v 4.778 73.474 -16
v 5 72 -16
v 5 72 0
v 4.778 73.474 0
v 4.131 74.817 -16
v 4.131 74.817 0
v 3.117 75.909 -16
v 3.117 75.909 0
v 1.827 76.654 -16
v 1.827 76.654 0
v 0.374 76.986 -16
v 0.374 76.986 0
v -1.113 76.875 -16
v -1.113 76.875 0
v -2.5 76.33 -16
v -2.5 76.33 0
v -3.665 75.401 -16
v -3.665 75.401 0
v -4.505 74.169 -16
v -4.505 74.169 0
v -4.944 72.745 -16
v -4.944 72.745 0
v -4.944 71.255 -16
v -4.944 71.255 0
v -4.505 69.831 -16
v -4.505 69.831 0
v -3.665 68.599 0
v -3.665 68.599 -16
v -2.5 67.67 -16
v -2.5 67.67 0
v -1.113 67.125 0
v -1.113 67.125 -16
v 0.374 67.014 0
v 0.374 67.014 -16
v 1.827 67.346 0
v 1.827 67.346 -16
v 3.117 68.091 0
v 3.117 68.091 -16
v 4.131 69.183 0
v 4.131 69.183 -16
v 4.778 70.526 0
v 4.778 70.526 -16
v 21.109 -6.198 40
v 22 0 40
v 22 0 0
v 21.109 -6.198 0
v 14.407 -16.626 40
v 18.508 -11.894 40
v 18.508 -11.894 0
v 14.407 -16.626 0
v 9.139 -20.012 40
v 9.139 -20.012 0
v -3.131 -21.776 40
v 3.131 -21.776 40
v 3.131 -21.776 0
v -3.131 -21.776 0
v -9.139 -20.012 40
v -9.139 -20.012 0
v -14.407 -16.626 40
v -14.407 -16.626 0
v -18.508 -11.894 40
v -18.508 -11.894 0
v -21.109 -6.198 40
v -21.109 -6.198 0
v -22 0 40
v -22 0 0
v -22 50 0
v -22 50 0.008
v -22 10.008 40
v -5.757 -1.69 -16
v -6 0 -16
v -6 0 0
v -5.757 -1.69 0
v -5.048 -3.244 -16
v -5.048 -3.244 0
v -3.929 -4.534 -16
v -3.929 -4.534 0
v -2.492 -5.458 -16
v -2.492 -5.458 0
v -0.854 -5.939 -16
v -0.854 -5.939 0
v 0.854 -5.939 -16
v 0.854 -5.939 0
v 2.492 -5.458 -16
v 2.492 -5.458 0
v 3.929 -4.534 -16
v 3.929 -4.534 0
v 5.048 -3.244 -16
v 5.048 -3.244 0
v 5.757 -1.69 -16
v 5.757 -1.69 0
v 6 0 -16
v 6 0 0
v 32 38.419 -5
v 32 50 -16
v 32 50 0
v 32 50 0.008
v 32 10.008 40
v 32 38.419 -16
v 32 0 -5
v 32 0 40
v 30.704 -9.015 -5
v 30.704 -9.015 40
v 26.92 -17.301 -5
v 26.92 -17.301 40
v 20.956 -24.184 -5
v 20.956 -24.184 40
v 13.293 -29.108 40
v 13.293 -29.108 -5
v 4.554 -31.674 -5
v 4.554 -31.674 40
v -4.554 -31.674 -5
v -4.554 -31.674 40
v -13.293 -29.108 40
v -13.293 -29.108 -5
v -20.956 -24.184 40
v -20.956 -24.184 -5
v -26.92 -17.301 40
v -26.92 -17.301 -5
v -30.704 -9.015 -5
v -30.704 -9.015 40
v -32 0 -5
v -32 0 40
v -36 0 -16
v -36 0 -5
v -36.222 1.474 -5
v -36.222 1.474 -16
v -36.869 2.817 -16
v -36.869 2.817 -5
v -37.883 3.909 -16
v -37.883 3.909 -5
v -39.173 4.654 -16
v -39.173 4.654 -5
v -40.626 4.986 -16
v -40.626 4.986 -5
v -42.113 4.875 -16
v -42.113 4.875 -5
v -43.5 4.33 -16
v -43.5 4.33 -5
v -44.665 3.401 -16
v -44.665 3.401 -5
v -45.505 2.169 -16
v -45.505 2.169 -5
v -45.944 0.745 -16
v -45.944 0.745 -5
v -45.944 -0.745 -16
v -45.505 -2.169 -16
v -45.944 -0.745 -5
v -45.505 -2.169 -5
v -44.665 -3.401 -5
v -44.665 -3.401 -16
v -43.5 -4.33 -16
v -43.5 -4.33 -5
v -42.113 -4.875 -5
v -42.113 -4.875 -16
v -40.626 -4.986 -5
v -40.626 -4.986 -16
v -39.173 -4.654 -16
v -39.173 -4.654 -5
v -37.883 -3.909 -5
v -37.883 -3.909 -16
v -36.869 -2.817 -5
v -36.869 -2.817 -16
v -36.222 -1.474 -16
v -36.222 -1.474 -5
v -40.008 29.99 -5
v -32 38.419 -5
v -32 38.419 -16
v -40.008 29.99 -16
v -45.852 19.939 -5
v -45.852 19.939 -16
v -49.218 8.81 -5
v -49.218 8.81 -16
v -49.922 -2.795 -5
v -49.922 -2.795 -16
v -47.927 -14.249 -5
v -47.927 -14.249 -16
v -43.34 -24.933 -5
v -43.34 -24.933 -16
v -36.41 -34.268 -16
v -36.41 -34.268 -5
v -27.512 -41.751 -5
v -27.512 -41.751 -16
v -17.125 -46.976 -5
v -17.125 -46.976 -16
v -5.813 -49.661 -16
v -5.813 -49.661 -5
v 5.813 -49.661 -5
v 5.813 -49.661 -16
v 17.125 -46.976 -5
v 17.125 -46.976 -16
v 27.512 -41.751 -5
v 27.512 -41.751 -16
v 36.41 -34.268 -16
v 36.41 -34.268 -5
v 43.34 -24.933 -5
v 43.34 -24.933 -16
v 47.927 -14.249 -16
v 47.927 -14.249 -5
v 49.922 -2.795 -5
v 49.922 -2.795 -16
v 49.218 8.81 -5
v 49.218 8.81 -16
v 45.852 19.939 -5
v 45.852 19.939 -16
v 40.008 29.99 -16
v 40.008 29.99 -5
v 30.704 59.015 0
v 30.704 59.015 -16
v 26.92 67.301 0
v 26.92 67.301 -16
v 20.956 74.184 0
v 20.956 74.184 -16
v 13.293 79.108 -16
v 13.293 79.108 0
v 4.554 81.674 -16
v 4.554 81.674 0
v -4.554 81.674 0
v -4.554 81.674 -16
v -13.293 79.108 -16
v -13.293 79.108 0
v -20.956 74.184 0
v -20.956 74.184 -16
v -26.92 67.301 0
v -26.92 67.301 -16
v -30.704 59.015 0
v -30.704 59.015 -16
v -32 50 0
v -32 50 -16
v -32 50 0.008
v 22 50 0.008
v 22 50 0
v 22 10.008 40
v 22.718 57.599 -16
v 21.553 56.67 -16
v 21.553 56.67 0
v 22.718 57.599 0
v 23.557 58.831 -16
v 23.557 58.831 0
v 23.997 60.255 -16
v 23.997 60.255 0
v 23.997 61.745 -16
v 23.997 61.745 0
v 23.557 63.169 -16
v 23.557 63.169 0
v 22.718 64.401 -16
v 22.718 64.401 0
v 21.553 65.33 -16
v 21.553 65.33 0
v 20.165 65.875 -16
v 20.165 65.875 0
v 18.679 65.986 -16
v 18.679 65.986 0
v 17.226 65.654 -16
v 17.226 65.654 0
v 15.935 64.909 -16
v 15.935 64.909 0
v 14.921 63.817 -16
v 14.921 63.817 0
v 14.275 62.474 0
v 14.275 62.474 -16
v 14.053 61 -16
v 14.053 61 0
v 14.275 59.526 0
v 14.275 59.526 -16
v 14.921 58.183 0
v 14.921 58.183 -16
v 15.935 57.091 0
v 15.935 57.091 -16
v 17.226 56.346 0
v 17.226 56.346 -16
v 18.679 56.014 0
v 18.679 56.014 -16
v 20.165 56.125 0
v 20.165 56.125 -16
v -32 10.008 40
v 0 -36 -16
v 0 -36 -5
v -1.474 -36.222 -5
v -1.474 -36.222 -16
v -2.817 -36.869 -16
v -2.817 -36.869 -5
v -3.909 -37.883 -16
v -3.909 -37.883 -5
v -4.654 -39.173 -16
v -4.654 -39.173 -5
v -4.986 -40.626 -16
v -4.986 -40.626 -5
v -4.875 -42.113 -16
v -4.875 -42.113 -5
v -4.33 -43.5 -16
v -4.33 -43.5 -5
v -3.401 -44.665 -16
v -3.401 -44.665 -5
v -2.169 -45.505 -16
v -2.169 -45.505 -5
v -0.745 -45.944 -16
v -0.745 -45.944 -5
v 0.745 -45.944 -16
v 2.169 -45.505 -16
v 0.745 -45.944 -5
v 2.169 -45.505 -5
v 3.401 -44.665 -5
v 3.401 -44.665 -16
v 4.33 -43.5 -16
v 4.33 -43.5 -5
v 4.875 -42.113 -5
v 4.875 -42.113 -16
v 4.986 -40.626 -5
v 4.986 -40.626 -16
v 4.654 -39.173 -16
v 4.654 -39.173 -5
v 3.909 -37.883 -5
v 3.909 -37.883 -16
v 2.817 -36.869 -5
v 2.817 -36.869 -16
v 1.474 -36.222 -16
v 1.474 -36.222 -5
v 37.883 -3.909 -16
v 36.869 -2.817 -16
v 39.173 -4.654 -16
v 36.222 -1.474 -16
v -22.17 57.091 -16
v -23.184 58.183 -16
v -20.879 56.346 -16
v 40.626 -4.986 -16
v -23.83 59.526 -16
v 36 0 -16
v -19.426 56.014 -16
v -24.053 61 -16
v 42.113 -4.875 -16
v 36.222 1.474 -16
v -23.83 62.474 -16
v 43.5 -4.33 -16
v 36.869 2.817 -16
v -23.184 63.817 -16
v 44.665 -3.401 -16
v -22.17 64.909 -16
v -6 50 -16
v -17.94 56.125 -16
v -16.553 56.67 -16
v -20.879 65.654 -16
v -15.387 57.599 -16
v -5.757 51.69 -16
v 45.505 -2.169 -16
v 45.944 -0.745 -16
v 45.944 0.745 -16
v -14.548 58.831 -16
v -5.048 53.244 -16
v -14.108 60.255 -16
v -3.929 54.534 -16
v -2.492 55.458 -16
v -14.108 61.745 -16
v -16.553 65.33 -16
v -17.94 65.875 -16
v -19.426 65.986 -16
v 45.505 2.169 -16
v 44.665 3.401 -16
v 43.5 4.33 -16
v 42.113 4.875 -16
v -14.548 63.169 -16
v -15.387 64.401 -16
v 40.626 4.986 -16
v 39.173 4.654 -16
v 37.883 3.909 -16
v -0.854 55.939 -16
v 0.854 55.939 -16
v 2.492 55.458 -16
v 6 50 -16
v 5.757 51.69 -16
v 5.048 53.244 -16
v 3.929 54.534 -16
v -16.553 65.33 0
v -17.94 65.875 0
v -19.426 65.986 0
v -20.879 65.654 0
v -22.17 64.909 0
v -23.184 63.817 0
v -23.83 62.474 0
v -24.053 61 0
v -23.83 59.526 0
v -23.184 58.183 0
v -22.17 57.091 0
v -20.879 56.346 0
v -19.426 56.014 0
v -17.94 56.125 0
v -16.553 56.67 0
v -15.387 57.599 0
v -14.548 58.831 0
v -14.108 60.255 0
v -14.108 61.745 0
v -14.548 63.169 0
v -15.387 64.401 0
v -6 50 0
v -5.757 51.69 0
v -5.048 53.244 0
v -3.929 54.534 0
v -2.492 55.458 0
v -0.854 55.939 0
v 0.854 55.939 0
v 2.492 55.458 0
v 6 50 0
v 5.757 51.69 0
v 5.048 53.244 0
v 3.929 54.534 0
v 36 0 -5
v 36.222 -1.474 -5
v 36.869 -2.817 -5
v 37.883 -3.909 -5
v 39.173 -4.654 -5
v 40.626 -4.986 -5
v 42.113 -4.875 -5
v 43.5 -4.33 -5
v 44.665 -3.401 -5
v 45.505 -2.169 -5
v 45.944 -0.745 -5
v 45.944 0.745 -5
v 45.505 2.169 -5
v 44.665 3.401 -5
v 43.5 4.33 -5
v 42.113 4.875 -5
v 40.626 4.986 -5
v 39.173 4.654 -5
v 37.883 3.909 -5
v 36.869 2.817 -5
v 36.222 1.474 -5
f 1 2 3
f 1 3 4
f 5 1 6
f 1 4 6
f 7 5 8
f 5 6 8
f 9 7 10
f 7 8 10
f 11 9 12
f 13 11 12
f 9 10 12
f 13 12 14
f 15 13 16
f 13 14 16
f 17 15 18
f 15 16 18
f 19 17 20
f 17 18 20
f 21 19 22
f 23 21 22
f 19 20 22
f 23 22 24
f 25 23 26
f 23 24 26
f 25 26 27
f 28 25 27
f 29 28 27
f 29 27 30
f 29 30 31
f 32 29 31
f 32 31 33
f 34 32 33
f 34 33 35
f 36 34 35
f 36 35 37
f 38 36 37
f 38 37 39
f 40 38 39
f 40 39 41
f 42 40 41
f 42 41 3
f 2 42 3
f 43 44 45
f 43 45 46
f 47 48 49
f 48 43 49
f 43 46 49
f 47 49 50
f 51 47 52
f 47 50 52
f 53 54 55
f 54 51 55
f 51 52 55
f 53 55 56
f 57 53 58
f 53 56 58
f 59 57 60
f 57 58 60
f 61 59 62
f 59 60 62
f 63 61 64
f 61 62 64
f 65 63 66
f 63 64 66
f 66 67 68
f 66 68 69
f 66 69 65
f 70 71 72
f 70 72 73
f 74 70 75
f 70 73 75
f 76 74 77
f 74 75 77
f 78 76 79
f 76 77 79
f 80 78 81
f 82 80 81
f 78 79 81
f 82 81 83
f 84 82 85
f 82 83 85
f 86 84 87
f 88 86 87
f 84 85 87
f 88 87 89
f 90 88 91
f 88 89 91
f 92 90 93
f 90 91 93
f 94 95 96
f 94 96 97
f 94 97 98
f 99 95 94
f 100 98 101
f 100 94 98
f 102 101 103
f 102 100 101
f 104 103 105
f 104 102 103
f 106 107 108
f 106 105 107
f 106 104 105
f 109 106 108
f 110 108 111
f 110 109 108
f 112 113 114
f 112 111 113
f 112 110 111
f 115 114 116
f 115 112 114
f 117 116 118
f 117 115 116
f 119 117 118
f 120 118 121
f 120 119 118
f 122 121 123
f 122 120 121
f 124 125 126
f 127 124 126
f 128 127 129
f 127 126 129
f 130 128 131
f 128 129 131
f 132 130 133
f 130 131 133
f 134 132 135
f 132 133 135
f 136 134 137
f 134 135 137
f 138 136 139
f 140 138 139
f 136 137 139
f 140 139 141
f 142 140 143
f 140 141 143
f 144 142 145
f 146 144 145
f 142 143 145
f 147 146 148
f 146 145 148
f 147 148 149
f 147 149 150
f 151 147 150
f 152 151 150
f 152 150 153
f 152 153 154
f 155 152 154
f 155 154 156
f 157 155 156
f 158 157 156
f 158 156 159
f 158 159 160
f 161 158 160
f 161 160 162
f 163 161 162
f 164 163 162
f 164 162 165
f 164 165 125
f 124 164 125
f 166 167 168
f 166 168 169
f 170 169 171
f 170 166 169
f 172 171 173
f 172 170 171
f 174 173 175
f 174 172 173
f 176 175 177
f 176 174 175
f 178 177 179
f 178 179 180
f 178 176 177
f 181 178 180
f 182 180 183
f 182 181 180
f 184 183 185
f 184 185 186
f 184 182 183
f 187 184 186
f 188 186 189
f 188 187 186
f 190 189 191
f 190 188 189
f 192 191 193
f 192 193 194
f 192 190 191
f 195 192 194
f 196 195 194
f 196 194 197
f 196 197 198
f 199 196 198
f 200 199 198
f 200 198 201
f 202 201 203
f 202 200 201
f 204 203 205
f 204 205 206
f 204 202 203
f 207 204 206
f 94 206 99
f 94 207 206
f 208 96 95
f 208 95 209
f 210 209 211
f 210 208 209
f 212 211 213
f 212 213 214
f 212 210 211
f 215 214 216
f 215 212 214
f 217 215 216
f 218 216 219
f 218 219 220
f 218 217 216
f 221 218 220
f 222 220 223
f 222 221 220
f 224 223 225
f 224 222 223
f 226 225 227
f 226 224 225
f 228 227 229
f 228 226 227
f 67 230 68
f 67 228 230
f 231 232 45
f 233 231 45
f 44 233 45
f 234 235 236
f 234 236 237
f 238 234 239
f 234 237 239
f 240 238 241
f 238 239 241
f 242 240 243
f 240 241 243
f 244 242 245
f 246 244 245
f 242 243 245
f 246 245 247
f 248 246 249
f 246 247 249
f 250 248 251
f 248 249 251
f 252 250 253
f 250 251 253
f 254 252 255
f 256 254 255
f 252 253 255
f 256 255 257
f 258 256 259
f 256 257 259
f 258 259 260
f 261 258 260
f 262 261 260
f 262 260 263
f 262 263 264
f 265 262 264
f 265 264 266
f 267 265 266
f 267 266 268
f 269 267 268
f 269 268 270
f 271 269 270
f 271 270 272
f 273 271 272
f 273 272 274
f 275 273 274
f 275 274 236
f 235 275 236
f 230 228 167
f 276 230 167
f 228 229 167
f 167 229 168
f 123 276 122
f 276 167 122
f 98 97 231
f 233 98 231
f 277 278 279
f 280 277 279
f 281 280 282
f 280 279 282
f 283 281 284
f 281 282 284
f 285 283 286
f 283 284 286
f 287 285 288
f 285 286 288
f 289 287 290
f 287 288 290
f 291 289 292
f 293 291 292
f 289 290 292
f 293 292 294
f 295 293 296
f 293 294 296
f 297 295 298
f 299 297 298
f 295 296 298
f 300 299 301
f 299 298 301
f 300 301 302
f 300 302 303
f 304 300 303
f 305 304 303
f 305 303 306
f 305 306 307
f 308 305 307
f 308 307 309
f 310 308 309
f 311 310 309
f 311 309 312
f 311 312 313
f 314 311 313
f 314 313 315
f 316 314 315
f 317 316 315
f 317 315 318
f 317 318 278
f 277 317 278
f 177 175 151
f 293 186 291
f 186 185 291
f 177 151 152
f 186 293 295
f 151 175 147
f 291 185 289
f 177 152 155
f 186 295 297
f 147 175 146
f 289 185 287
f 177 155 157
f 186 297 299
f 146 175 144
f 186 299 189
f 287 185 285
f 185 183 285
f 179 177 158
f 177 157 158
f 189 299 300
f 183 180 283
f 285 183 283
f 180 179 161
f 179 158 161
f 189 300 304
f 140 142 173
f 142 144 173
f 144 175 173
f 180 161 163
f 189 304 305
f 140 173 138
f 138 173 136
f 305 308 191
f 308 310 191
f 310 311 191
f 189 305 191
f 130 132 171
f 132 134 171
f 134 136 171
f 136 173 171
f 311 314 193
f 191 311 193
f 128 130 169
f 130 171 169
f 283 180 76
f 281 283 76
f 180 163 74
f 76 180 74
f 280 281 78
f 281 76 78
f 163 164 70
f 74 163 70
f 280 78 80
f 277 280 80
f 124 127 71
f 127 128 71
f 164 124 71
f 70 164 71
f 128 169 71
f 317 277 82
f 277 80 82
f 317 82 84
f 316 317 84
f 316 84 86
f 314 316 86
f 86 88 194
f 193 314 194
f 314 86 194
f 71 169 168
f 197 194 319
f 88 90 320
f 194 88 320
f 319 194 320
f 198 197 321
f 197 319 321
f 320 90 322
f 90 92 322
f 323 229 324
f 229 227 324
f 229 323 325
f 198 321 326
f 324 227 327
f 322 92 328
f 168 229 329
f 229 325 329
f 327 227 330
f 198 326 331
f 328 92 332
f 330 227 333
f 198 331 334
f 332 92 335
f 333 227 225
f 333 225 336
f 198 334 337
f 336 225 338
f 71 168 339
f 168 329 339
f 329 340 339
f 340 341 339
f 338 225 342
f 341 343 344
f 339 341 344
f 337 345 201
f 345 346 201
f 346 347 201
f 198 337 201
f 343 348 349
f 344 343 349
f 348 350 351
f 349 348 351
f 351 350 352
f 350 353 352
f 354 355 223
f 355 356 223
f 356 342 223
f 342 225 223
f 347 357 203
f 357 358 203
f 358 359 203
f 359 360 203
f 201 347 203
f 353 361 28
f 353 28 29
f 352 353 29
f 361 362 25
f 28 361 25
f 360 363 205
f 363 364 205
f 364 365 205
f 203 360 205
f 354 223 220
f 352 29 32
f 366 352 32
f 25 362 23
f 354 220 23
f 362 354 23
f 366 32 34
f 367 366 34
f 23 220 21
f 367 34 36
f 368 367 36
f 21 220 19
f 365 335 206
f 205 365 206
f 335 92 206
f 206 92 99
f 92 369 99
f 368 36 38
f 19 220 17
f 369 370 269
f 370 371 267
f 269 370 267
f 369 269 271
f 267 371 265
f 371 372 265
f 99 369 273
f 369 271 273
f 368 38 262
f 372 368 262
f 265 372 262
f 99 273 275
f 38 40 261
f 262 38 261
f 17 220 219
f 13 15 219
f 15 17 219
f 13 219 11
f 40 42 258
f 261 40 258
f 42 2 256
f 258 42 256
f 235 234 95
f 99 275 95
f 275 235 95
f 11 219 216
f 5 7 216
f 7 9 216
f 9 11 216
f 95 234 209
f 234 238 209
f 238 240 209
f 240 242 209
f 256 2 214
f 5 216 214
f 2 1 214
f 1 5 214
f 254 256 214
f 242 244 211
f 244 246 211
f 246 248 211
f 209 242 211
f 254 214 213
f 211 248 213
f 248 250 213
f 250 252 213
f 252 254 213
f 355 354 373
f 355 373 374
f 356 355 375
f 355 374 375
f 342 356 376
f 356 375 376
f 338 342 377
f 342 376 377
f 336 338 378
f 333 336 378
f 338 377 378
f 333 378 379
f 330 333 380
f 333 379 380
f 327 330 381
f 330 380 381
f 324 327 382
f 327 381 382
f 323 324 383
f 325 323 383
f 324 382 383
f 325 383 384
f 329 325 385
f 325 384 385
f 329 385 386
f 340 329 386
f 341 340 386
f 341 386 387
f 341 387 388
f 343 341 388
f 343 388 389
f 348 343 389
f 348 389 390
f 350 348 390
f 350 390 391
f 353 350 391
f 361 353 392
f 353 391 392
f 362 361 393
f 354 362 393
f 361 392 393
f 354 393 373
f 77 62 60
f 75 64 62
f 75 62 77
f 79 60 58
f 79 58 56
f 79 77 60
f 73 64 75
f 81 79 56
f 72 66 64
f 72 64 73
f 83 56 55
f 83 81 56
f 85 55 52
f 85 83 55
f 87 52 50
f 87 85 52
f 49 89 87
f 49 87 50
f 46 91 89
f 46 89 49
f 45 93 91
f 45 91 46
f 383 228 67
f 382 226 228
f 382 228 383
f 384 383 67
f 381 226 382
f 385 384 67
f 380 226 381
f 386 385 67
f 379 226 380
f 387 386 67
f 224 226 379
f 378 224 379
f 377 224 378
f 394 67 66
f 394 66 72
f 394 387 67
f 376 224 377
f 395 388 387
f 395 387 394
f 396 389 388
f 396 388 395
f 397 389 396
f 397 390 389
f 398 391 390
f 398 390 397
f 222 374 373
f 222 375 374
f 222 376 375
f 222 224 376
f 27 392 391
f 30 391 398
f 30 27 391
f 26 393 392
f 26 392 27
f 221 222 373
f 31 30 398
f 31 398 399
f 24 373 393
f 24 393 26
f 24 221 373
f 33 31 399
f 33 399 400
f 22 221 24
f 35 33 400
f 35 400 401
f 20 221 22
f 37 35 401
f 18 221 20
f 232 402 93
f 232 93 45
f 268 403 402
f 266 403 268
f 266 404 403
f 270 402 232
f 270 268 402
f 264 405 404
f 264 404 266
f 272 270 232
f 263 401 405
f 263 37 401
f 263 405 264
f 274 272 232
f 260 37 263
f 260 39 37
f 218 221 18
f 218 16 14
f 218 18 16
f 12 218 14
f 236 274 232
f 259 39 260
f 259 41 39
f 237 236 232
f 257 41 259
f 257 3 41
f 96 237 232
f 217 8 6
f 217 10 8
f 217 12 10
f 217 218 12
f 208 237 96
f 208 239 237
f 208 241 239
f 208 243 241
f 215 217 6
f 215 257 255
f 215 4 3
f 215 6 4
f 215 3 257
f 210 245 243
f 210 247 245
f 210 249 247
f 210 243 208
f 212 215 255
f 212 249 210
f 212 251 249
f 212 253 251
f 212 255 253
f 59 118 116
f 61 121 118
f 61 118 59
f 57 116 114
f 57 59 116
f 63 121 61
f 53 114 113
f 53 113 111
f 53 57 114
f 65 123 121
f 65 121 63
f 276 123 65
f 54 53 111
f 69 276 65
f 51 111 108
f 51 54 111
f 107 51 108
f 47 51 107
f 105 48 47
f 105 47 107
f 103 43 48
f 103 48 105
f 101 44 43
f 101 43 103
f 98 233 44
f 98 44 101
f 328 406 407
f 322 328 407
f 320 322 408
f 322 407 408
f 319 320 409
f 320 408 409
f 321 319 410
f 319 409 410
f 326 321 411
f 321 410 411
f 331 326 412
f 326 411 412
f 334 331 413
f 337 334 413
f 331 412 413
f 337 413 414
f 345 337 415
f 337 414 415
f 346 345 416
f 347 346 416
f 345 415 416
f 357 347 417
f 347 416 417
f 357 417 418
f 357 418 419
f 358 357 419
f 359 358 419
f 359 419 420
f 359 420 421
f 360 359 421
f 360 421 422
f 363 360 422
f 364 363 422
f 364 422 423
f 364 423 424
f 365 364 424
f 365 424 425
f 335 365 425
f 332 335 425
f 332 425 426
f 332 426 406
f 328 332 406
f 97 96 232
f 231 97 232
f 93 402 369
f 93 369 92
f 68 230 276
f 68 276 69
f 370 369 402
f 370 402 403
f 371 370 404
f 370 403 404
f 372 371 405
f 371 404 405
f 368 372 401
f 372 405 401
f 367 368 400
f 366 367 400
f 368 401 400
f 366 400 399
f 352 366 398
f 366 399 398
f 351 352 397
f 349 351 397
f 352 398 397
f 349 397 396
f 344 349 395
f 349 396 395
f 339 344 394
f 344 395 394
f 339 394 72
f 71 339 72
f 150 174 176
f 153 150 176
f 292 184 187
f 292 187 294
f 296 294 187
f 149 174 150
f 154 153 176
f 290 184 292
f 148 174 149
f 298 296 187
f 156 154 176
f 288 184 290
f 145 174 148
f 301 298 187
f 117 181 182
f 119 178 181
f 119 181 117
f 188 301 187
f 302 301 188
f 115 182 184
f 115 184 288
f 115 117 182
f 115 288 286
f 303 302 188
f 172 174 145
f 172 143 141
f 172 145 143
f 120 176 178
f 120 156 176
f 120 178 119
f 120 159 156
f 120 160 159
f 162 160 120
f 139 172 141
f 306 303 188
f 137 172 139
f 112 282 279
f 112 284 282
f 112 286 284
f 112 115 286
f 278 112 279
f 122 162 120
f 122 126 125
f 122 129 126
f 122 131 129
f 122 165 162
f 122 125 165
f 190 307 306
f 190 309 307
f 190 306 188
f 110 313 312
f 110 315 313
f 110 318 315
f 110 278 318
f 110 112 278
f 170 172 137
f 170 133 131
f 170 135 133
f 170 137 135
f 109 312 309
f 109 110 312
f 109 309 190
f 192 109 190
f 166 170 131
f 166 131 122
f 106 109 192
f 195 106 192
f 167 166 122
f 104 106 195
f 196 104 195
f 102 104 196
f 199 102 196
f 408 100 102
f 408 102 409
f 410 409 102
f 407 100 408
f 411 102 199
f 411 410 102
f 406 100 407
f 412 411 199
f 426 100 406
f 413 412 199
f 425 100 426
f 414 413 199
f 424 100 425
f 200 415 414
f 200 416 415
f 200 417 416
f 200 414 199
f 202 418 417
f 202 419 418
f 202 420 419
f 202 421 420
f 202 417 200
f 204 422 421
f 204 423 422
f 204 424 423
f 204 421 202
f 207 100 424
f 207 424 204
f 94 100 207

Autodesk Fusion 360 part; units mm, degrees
sketch "Sketch1" plane through (0, 0, 0) normal (0, 0, 1) x (1, 0, 0)
  circle A0 centre (-41, 0) radius 5
  line L0 (-32, 50) -> (-32, 0)
  line L1 (32, 50) -> (32, 0)
  arc A1 (-32, 38.4187) -> (32, 38.4187) centre (0, 0) ccw
  arc A2 (-32, 25.632) -> (32, 25.632) centre (0, 0) ccw construction
  arc A3 (-32, 0) -> (32, 0) centre (0, 0) ccw
  arc A4 (32, 50) -> (-32, 50) centre (0, 50) ccw
  circle A5 centre (0, 50) radius 22 construction
  circle A6 centre (0, 72) radius 5
  line L2 (6, 50) -> (6, 0)
  line L3 (-6, 50) -> (-6, 0)
  arc A7 (-6, 0) -> (6, 0) centre (0, 0) ccw
  arc A8 (6, 50) -> (-6, 50) centre (0, 50) ccw
  line L4 (-32, 50) -> (-22, 50)
  line L5 (32, 50) -> (22, 50)
  line L6 (-22, 50) -> (-22, 0)
  line L7 (22, 50) -> (22, 0)
  arc A9 (-22, 0) -> (22, 0) centre (0, 0) ccw
  line L8 (-32, 12) -> (-22, 12)
  line L9 (22, 12) -> (32, 12)
  dimension "d1" = 100
  dimension "d2" = 82
  dimension "d3" = 10
  dimension "d4" = 41
  dimension "d5" = 64
  dimension "d6" = 64
  dimension "d7" = 50
  dimension "d8" = 50
  dimension "d9" = 12
  dimension "d10" = 12
  dimension "d11" = 44
  dimension "d12" = 44
  dimension "d13" = 10
  dimension "d14" = 22
  dimension "d15" = 12
  dimension "d16" = 12
extrude "Extrude1" add sketch "Sketch1" against normal blind 16 contours A0 | L0 L1 A1 A3 makes body 1
extrude "Extrude3" cut sketch "Sketch1" against normal blind 5 contours A0 | L0 L1 A1 A3 bodies 1
extrude "Extrude2" add sketch "Sketch1" against normal blind 16 separate body contours A4 L4 L5 L6 L7 A9 | A6 makes body 2
extrude "Extrude4" add sketch "Sketch1" along normal blind 40 and the other way up to surface (16 mm away) contours L0 L4 L6 L8 | L1 L5 L7 L9 | L0 L1 A3 L6 L7 A9 L8 L9 bodies 1 2
chamfer "Chamfer1" distance 40 angle 45 2 edges at (-27, 50, 40) (27, 50, 40) on bodies 1
extrude "Extrude6" cut sketch "Sketch1" against normal through all contours A0 bodies 1
extrude "Extrude7" cut sketch "Sketch1" against normal through all contours A6 bodies 1
pattern_circular "C-Pattern1" count 3 over 180 about axis through (0, 0, 1.75) along (0, 0, 1) of "Extrude6"
pattern_circular "C-Pattern2" count 3 over 120 about axis through (0, 50, 0) along (0, 0, -1) both ways of "Extrude7"
equation "d4 = d2 / 2"
equation "d14 = d11 / 2"
